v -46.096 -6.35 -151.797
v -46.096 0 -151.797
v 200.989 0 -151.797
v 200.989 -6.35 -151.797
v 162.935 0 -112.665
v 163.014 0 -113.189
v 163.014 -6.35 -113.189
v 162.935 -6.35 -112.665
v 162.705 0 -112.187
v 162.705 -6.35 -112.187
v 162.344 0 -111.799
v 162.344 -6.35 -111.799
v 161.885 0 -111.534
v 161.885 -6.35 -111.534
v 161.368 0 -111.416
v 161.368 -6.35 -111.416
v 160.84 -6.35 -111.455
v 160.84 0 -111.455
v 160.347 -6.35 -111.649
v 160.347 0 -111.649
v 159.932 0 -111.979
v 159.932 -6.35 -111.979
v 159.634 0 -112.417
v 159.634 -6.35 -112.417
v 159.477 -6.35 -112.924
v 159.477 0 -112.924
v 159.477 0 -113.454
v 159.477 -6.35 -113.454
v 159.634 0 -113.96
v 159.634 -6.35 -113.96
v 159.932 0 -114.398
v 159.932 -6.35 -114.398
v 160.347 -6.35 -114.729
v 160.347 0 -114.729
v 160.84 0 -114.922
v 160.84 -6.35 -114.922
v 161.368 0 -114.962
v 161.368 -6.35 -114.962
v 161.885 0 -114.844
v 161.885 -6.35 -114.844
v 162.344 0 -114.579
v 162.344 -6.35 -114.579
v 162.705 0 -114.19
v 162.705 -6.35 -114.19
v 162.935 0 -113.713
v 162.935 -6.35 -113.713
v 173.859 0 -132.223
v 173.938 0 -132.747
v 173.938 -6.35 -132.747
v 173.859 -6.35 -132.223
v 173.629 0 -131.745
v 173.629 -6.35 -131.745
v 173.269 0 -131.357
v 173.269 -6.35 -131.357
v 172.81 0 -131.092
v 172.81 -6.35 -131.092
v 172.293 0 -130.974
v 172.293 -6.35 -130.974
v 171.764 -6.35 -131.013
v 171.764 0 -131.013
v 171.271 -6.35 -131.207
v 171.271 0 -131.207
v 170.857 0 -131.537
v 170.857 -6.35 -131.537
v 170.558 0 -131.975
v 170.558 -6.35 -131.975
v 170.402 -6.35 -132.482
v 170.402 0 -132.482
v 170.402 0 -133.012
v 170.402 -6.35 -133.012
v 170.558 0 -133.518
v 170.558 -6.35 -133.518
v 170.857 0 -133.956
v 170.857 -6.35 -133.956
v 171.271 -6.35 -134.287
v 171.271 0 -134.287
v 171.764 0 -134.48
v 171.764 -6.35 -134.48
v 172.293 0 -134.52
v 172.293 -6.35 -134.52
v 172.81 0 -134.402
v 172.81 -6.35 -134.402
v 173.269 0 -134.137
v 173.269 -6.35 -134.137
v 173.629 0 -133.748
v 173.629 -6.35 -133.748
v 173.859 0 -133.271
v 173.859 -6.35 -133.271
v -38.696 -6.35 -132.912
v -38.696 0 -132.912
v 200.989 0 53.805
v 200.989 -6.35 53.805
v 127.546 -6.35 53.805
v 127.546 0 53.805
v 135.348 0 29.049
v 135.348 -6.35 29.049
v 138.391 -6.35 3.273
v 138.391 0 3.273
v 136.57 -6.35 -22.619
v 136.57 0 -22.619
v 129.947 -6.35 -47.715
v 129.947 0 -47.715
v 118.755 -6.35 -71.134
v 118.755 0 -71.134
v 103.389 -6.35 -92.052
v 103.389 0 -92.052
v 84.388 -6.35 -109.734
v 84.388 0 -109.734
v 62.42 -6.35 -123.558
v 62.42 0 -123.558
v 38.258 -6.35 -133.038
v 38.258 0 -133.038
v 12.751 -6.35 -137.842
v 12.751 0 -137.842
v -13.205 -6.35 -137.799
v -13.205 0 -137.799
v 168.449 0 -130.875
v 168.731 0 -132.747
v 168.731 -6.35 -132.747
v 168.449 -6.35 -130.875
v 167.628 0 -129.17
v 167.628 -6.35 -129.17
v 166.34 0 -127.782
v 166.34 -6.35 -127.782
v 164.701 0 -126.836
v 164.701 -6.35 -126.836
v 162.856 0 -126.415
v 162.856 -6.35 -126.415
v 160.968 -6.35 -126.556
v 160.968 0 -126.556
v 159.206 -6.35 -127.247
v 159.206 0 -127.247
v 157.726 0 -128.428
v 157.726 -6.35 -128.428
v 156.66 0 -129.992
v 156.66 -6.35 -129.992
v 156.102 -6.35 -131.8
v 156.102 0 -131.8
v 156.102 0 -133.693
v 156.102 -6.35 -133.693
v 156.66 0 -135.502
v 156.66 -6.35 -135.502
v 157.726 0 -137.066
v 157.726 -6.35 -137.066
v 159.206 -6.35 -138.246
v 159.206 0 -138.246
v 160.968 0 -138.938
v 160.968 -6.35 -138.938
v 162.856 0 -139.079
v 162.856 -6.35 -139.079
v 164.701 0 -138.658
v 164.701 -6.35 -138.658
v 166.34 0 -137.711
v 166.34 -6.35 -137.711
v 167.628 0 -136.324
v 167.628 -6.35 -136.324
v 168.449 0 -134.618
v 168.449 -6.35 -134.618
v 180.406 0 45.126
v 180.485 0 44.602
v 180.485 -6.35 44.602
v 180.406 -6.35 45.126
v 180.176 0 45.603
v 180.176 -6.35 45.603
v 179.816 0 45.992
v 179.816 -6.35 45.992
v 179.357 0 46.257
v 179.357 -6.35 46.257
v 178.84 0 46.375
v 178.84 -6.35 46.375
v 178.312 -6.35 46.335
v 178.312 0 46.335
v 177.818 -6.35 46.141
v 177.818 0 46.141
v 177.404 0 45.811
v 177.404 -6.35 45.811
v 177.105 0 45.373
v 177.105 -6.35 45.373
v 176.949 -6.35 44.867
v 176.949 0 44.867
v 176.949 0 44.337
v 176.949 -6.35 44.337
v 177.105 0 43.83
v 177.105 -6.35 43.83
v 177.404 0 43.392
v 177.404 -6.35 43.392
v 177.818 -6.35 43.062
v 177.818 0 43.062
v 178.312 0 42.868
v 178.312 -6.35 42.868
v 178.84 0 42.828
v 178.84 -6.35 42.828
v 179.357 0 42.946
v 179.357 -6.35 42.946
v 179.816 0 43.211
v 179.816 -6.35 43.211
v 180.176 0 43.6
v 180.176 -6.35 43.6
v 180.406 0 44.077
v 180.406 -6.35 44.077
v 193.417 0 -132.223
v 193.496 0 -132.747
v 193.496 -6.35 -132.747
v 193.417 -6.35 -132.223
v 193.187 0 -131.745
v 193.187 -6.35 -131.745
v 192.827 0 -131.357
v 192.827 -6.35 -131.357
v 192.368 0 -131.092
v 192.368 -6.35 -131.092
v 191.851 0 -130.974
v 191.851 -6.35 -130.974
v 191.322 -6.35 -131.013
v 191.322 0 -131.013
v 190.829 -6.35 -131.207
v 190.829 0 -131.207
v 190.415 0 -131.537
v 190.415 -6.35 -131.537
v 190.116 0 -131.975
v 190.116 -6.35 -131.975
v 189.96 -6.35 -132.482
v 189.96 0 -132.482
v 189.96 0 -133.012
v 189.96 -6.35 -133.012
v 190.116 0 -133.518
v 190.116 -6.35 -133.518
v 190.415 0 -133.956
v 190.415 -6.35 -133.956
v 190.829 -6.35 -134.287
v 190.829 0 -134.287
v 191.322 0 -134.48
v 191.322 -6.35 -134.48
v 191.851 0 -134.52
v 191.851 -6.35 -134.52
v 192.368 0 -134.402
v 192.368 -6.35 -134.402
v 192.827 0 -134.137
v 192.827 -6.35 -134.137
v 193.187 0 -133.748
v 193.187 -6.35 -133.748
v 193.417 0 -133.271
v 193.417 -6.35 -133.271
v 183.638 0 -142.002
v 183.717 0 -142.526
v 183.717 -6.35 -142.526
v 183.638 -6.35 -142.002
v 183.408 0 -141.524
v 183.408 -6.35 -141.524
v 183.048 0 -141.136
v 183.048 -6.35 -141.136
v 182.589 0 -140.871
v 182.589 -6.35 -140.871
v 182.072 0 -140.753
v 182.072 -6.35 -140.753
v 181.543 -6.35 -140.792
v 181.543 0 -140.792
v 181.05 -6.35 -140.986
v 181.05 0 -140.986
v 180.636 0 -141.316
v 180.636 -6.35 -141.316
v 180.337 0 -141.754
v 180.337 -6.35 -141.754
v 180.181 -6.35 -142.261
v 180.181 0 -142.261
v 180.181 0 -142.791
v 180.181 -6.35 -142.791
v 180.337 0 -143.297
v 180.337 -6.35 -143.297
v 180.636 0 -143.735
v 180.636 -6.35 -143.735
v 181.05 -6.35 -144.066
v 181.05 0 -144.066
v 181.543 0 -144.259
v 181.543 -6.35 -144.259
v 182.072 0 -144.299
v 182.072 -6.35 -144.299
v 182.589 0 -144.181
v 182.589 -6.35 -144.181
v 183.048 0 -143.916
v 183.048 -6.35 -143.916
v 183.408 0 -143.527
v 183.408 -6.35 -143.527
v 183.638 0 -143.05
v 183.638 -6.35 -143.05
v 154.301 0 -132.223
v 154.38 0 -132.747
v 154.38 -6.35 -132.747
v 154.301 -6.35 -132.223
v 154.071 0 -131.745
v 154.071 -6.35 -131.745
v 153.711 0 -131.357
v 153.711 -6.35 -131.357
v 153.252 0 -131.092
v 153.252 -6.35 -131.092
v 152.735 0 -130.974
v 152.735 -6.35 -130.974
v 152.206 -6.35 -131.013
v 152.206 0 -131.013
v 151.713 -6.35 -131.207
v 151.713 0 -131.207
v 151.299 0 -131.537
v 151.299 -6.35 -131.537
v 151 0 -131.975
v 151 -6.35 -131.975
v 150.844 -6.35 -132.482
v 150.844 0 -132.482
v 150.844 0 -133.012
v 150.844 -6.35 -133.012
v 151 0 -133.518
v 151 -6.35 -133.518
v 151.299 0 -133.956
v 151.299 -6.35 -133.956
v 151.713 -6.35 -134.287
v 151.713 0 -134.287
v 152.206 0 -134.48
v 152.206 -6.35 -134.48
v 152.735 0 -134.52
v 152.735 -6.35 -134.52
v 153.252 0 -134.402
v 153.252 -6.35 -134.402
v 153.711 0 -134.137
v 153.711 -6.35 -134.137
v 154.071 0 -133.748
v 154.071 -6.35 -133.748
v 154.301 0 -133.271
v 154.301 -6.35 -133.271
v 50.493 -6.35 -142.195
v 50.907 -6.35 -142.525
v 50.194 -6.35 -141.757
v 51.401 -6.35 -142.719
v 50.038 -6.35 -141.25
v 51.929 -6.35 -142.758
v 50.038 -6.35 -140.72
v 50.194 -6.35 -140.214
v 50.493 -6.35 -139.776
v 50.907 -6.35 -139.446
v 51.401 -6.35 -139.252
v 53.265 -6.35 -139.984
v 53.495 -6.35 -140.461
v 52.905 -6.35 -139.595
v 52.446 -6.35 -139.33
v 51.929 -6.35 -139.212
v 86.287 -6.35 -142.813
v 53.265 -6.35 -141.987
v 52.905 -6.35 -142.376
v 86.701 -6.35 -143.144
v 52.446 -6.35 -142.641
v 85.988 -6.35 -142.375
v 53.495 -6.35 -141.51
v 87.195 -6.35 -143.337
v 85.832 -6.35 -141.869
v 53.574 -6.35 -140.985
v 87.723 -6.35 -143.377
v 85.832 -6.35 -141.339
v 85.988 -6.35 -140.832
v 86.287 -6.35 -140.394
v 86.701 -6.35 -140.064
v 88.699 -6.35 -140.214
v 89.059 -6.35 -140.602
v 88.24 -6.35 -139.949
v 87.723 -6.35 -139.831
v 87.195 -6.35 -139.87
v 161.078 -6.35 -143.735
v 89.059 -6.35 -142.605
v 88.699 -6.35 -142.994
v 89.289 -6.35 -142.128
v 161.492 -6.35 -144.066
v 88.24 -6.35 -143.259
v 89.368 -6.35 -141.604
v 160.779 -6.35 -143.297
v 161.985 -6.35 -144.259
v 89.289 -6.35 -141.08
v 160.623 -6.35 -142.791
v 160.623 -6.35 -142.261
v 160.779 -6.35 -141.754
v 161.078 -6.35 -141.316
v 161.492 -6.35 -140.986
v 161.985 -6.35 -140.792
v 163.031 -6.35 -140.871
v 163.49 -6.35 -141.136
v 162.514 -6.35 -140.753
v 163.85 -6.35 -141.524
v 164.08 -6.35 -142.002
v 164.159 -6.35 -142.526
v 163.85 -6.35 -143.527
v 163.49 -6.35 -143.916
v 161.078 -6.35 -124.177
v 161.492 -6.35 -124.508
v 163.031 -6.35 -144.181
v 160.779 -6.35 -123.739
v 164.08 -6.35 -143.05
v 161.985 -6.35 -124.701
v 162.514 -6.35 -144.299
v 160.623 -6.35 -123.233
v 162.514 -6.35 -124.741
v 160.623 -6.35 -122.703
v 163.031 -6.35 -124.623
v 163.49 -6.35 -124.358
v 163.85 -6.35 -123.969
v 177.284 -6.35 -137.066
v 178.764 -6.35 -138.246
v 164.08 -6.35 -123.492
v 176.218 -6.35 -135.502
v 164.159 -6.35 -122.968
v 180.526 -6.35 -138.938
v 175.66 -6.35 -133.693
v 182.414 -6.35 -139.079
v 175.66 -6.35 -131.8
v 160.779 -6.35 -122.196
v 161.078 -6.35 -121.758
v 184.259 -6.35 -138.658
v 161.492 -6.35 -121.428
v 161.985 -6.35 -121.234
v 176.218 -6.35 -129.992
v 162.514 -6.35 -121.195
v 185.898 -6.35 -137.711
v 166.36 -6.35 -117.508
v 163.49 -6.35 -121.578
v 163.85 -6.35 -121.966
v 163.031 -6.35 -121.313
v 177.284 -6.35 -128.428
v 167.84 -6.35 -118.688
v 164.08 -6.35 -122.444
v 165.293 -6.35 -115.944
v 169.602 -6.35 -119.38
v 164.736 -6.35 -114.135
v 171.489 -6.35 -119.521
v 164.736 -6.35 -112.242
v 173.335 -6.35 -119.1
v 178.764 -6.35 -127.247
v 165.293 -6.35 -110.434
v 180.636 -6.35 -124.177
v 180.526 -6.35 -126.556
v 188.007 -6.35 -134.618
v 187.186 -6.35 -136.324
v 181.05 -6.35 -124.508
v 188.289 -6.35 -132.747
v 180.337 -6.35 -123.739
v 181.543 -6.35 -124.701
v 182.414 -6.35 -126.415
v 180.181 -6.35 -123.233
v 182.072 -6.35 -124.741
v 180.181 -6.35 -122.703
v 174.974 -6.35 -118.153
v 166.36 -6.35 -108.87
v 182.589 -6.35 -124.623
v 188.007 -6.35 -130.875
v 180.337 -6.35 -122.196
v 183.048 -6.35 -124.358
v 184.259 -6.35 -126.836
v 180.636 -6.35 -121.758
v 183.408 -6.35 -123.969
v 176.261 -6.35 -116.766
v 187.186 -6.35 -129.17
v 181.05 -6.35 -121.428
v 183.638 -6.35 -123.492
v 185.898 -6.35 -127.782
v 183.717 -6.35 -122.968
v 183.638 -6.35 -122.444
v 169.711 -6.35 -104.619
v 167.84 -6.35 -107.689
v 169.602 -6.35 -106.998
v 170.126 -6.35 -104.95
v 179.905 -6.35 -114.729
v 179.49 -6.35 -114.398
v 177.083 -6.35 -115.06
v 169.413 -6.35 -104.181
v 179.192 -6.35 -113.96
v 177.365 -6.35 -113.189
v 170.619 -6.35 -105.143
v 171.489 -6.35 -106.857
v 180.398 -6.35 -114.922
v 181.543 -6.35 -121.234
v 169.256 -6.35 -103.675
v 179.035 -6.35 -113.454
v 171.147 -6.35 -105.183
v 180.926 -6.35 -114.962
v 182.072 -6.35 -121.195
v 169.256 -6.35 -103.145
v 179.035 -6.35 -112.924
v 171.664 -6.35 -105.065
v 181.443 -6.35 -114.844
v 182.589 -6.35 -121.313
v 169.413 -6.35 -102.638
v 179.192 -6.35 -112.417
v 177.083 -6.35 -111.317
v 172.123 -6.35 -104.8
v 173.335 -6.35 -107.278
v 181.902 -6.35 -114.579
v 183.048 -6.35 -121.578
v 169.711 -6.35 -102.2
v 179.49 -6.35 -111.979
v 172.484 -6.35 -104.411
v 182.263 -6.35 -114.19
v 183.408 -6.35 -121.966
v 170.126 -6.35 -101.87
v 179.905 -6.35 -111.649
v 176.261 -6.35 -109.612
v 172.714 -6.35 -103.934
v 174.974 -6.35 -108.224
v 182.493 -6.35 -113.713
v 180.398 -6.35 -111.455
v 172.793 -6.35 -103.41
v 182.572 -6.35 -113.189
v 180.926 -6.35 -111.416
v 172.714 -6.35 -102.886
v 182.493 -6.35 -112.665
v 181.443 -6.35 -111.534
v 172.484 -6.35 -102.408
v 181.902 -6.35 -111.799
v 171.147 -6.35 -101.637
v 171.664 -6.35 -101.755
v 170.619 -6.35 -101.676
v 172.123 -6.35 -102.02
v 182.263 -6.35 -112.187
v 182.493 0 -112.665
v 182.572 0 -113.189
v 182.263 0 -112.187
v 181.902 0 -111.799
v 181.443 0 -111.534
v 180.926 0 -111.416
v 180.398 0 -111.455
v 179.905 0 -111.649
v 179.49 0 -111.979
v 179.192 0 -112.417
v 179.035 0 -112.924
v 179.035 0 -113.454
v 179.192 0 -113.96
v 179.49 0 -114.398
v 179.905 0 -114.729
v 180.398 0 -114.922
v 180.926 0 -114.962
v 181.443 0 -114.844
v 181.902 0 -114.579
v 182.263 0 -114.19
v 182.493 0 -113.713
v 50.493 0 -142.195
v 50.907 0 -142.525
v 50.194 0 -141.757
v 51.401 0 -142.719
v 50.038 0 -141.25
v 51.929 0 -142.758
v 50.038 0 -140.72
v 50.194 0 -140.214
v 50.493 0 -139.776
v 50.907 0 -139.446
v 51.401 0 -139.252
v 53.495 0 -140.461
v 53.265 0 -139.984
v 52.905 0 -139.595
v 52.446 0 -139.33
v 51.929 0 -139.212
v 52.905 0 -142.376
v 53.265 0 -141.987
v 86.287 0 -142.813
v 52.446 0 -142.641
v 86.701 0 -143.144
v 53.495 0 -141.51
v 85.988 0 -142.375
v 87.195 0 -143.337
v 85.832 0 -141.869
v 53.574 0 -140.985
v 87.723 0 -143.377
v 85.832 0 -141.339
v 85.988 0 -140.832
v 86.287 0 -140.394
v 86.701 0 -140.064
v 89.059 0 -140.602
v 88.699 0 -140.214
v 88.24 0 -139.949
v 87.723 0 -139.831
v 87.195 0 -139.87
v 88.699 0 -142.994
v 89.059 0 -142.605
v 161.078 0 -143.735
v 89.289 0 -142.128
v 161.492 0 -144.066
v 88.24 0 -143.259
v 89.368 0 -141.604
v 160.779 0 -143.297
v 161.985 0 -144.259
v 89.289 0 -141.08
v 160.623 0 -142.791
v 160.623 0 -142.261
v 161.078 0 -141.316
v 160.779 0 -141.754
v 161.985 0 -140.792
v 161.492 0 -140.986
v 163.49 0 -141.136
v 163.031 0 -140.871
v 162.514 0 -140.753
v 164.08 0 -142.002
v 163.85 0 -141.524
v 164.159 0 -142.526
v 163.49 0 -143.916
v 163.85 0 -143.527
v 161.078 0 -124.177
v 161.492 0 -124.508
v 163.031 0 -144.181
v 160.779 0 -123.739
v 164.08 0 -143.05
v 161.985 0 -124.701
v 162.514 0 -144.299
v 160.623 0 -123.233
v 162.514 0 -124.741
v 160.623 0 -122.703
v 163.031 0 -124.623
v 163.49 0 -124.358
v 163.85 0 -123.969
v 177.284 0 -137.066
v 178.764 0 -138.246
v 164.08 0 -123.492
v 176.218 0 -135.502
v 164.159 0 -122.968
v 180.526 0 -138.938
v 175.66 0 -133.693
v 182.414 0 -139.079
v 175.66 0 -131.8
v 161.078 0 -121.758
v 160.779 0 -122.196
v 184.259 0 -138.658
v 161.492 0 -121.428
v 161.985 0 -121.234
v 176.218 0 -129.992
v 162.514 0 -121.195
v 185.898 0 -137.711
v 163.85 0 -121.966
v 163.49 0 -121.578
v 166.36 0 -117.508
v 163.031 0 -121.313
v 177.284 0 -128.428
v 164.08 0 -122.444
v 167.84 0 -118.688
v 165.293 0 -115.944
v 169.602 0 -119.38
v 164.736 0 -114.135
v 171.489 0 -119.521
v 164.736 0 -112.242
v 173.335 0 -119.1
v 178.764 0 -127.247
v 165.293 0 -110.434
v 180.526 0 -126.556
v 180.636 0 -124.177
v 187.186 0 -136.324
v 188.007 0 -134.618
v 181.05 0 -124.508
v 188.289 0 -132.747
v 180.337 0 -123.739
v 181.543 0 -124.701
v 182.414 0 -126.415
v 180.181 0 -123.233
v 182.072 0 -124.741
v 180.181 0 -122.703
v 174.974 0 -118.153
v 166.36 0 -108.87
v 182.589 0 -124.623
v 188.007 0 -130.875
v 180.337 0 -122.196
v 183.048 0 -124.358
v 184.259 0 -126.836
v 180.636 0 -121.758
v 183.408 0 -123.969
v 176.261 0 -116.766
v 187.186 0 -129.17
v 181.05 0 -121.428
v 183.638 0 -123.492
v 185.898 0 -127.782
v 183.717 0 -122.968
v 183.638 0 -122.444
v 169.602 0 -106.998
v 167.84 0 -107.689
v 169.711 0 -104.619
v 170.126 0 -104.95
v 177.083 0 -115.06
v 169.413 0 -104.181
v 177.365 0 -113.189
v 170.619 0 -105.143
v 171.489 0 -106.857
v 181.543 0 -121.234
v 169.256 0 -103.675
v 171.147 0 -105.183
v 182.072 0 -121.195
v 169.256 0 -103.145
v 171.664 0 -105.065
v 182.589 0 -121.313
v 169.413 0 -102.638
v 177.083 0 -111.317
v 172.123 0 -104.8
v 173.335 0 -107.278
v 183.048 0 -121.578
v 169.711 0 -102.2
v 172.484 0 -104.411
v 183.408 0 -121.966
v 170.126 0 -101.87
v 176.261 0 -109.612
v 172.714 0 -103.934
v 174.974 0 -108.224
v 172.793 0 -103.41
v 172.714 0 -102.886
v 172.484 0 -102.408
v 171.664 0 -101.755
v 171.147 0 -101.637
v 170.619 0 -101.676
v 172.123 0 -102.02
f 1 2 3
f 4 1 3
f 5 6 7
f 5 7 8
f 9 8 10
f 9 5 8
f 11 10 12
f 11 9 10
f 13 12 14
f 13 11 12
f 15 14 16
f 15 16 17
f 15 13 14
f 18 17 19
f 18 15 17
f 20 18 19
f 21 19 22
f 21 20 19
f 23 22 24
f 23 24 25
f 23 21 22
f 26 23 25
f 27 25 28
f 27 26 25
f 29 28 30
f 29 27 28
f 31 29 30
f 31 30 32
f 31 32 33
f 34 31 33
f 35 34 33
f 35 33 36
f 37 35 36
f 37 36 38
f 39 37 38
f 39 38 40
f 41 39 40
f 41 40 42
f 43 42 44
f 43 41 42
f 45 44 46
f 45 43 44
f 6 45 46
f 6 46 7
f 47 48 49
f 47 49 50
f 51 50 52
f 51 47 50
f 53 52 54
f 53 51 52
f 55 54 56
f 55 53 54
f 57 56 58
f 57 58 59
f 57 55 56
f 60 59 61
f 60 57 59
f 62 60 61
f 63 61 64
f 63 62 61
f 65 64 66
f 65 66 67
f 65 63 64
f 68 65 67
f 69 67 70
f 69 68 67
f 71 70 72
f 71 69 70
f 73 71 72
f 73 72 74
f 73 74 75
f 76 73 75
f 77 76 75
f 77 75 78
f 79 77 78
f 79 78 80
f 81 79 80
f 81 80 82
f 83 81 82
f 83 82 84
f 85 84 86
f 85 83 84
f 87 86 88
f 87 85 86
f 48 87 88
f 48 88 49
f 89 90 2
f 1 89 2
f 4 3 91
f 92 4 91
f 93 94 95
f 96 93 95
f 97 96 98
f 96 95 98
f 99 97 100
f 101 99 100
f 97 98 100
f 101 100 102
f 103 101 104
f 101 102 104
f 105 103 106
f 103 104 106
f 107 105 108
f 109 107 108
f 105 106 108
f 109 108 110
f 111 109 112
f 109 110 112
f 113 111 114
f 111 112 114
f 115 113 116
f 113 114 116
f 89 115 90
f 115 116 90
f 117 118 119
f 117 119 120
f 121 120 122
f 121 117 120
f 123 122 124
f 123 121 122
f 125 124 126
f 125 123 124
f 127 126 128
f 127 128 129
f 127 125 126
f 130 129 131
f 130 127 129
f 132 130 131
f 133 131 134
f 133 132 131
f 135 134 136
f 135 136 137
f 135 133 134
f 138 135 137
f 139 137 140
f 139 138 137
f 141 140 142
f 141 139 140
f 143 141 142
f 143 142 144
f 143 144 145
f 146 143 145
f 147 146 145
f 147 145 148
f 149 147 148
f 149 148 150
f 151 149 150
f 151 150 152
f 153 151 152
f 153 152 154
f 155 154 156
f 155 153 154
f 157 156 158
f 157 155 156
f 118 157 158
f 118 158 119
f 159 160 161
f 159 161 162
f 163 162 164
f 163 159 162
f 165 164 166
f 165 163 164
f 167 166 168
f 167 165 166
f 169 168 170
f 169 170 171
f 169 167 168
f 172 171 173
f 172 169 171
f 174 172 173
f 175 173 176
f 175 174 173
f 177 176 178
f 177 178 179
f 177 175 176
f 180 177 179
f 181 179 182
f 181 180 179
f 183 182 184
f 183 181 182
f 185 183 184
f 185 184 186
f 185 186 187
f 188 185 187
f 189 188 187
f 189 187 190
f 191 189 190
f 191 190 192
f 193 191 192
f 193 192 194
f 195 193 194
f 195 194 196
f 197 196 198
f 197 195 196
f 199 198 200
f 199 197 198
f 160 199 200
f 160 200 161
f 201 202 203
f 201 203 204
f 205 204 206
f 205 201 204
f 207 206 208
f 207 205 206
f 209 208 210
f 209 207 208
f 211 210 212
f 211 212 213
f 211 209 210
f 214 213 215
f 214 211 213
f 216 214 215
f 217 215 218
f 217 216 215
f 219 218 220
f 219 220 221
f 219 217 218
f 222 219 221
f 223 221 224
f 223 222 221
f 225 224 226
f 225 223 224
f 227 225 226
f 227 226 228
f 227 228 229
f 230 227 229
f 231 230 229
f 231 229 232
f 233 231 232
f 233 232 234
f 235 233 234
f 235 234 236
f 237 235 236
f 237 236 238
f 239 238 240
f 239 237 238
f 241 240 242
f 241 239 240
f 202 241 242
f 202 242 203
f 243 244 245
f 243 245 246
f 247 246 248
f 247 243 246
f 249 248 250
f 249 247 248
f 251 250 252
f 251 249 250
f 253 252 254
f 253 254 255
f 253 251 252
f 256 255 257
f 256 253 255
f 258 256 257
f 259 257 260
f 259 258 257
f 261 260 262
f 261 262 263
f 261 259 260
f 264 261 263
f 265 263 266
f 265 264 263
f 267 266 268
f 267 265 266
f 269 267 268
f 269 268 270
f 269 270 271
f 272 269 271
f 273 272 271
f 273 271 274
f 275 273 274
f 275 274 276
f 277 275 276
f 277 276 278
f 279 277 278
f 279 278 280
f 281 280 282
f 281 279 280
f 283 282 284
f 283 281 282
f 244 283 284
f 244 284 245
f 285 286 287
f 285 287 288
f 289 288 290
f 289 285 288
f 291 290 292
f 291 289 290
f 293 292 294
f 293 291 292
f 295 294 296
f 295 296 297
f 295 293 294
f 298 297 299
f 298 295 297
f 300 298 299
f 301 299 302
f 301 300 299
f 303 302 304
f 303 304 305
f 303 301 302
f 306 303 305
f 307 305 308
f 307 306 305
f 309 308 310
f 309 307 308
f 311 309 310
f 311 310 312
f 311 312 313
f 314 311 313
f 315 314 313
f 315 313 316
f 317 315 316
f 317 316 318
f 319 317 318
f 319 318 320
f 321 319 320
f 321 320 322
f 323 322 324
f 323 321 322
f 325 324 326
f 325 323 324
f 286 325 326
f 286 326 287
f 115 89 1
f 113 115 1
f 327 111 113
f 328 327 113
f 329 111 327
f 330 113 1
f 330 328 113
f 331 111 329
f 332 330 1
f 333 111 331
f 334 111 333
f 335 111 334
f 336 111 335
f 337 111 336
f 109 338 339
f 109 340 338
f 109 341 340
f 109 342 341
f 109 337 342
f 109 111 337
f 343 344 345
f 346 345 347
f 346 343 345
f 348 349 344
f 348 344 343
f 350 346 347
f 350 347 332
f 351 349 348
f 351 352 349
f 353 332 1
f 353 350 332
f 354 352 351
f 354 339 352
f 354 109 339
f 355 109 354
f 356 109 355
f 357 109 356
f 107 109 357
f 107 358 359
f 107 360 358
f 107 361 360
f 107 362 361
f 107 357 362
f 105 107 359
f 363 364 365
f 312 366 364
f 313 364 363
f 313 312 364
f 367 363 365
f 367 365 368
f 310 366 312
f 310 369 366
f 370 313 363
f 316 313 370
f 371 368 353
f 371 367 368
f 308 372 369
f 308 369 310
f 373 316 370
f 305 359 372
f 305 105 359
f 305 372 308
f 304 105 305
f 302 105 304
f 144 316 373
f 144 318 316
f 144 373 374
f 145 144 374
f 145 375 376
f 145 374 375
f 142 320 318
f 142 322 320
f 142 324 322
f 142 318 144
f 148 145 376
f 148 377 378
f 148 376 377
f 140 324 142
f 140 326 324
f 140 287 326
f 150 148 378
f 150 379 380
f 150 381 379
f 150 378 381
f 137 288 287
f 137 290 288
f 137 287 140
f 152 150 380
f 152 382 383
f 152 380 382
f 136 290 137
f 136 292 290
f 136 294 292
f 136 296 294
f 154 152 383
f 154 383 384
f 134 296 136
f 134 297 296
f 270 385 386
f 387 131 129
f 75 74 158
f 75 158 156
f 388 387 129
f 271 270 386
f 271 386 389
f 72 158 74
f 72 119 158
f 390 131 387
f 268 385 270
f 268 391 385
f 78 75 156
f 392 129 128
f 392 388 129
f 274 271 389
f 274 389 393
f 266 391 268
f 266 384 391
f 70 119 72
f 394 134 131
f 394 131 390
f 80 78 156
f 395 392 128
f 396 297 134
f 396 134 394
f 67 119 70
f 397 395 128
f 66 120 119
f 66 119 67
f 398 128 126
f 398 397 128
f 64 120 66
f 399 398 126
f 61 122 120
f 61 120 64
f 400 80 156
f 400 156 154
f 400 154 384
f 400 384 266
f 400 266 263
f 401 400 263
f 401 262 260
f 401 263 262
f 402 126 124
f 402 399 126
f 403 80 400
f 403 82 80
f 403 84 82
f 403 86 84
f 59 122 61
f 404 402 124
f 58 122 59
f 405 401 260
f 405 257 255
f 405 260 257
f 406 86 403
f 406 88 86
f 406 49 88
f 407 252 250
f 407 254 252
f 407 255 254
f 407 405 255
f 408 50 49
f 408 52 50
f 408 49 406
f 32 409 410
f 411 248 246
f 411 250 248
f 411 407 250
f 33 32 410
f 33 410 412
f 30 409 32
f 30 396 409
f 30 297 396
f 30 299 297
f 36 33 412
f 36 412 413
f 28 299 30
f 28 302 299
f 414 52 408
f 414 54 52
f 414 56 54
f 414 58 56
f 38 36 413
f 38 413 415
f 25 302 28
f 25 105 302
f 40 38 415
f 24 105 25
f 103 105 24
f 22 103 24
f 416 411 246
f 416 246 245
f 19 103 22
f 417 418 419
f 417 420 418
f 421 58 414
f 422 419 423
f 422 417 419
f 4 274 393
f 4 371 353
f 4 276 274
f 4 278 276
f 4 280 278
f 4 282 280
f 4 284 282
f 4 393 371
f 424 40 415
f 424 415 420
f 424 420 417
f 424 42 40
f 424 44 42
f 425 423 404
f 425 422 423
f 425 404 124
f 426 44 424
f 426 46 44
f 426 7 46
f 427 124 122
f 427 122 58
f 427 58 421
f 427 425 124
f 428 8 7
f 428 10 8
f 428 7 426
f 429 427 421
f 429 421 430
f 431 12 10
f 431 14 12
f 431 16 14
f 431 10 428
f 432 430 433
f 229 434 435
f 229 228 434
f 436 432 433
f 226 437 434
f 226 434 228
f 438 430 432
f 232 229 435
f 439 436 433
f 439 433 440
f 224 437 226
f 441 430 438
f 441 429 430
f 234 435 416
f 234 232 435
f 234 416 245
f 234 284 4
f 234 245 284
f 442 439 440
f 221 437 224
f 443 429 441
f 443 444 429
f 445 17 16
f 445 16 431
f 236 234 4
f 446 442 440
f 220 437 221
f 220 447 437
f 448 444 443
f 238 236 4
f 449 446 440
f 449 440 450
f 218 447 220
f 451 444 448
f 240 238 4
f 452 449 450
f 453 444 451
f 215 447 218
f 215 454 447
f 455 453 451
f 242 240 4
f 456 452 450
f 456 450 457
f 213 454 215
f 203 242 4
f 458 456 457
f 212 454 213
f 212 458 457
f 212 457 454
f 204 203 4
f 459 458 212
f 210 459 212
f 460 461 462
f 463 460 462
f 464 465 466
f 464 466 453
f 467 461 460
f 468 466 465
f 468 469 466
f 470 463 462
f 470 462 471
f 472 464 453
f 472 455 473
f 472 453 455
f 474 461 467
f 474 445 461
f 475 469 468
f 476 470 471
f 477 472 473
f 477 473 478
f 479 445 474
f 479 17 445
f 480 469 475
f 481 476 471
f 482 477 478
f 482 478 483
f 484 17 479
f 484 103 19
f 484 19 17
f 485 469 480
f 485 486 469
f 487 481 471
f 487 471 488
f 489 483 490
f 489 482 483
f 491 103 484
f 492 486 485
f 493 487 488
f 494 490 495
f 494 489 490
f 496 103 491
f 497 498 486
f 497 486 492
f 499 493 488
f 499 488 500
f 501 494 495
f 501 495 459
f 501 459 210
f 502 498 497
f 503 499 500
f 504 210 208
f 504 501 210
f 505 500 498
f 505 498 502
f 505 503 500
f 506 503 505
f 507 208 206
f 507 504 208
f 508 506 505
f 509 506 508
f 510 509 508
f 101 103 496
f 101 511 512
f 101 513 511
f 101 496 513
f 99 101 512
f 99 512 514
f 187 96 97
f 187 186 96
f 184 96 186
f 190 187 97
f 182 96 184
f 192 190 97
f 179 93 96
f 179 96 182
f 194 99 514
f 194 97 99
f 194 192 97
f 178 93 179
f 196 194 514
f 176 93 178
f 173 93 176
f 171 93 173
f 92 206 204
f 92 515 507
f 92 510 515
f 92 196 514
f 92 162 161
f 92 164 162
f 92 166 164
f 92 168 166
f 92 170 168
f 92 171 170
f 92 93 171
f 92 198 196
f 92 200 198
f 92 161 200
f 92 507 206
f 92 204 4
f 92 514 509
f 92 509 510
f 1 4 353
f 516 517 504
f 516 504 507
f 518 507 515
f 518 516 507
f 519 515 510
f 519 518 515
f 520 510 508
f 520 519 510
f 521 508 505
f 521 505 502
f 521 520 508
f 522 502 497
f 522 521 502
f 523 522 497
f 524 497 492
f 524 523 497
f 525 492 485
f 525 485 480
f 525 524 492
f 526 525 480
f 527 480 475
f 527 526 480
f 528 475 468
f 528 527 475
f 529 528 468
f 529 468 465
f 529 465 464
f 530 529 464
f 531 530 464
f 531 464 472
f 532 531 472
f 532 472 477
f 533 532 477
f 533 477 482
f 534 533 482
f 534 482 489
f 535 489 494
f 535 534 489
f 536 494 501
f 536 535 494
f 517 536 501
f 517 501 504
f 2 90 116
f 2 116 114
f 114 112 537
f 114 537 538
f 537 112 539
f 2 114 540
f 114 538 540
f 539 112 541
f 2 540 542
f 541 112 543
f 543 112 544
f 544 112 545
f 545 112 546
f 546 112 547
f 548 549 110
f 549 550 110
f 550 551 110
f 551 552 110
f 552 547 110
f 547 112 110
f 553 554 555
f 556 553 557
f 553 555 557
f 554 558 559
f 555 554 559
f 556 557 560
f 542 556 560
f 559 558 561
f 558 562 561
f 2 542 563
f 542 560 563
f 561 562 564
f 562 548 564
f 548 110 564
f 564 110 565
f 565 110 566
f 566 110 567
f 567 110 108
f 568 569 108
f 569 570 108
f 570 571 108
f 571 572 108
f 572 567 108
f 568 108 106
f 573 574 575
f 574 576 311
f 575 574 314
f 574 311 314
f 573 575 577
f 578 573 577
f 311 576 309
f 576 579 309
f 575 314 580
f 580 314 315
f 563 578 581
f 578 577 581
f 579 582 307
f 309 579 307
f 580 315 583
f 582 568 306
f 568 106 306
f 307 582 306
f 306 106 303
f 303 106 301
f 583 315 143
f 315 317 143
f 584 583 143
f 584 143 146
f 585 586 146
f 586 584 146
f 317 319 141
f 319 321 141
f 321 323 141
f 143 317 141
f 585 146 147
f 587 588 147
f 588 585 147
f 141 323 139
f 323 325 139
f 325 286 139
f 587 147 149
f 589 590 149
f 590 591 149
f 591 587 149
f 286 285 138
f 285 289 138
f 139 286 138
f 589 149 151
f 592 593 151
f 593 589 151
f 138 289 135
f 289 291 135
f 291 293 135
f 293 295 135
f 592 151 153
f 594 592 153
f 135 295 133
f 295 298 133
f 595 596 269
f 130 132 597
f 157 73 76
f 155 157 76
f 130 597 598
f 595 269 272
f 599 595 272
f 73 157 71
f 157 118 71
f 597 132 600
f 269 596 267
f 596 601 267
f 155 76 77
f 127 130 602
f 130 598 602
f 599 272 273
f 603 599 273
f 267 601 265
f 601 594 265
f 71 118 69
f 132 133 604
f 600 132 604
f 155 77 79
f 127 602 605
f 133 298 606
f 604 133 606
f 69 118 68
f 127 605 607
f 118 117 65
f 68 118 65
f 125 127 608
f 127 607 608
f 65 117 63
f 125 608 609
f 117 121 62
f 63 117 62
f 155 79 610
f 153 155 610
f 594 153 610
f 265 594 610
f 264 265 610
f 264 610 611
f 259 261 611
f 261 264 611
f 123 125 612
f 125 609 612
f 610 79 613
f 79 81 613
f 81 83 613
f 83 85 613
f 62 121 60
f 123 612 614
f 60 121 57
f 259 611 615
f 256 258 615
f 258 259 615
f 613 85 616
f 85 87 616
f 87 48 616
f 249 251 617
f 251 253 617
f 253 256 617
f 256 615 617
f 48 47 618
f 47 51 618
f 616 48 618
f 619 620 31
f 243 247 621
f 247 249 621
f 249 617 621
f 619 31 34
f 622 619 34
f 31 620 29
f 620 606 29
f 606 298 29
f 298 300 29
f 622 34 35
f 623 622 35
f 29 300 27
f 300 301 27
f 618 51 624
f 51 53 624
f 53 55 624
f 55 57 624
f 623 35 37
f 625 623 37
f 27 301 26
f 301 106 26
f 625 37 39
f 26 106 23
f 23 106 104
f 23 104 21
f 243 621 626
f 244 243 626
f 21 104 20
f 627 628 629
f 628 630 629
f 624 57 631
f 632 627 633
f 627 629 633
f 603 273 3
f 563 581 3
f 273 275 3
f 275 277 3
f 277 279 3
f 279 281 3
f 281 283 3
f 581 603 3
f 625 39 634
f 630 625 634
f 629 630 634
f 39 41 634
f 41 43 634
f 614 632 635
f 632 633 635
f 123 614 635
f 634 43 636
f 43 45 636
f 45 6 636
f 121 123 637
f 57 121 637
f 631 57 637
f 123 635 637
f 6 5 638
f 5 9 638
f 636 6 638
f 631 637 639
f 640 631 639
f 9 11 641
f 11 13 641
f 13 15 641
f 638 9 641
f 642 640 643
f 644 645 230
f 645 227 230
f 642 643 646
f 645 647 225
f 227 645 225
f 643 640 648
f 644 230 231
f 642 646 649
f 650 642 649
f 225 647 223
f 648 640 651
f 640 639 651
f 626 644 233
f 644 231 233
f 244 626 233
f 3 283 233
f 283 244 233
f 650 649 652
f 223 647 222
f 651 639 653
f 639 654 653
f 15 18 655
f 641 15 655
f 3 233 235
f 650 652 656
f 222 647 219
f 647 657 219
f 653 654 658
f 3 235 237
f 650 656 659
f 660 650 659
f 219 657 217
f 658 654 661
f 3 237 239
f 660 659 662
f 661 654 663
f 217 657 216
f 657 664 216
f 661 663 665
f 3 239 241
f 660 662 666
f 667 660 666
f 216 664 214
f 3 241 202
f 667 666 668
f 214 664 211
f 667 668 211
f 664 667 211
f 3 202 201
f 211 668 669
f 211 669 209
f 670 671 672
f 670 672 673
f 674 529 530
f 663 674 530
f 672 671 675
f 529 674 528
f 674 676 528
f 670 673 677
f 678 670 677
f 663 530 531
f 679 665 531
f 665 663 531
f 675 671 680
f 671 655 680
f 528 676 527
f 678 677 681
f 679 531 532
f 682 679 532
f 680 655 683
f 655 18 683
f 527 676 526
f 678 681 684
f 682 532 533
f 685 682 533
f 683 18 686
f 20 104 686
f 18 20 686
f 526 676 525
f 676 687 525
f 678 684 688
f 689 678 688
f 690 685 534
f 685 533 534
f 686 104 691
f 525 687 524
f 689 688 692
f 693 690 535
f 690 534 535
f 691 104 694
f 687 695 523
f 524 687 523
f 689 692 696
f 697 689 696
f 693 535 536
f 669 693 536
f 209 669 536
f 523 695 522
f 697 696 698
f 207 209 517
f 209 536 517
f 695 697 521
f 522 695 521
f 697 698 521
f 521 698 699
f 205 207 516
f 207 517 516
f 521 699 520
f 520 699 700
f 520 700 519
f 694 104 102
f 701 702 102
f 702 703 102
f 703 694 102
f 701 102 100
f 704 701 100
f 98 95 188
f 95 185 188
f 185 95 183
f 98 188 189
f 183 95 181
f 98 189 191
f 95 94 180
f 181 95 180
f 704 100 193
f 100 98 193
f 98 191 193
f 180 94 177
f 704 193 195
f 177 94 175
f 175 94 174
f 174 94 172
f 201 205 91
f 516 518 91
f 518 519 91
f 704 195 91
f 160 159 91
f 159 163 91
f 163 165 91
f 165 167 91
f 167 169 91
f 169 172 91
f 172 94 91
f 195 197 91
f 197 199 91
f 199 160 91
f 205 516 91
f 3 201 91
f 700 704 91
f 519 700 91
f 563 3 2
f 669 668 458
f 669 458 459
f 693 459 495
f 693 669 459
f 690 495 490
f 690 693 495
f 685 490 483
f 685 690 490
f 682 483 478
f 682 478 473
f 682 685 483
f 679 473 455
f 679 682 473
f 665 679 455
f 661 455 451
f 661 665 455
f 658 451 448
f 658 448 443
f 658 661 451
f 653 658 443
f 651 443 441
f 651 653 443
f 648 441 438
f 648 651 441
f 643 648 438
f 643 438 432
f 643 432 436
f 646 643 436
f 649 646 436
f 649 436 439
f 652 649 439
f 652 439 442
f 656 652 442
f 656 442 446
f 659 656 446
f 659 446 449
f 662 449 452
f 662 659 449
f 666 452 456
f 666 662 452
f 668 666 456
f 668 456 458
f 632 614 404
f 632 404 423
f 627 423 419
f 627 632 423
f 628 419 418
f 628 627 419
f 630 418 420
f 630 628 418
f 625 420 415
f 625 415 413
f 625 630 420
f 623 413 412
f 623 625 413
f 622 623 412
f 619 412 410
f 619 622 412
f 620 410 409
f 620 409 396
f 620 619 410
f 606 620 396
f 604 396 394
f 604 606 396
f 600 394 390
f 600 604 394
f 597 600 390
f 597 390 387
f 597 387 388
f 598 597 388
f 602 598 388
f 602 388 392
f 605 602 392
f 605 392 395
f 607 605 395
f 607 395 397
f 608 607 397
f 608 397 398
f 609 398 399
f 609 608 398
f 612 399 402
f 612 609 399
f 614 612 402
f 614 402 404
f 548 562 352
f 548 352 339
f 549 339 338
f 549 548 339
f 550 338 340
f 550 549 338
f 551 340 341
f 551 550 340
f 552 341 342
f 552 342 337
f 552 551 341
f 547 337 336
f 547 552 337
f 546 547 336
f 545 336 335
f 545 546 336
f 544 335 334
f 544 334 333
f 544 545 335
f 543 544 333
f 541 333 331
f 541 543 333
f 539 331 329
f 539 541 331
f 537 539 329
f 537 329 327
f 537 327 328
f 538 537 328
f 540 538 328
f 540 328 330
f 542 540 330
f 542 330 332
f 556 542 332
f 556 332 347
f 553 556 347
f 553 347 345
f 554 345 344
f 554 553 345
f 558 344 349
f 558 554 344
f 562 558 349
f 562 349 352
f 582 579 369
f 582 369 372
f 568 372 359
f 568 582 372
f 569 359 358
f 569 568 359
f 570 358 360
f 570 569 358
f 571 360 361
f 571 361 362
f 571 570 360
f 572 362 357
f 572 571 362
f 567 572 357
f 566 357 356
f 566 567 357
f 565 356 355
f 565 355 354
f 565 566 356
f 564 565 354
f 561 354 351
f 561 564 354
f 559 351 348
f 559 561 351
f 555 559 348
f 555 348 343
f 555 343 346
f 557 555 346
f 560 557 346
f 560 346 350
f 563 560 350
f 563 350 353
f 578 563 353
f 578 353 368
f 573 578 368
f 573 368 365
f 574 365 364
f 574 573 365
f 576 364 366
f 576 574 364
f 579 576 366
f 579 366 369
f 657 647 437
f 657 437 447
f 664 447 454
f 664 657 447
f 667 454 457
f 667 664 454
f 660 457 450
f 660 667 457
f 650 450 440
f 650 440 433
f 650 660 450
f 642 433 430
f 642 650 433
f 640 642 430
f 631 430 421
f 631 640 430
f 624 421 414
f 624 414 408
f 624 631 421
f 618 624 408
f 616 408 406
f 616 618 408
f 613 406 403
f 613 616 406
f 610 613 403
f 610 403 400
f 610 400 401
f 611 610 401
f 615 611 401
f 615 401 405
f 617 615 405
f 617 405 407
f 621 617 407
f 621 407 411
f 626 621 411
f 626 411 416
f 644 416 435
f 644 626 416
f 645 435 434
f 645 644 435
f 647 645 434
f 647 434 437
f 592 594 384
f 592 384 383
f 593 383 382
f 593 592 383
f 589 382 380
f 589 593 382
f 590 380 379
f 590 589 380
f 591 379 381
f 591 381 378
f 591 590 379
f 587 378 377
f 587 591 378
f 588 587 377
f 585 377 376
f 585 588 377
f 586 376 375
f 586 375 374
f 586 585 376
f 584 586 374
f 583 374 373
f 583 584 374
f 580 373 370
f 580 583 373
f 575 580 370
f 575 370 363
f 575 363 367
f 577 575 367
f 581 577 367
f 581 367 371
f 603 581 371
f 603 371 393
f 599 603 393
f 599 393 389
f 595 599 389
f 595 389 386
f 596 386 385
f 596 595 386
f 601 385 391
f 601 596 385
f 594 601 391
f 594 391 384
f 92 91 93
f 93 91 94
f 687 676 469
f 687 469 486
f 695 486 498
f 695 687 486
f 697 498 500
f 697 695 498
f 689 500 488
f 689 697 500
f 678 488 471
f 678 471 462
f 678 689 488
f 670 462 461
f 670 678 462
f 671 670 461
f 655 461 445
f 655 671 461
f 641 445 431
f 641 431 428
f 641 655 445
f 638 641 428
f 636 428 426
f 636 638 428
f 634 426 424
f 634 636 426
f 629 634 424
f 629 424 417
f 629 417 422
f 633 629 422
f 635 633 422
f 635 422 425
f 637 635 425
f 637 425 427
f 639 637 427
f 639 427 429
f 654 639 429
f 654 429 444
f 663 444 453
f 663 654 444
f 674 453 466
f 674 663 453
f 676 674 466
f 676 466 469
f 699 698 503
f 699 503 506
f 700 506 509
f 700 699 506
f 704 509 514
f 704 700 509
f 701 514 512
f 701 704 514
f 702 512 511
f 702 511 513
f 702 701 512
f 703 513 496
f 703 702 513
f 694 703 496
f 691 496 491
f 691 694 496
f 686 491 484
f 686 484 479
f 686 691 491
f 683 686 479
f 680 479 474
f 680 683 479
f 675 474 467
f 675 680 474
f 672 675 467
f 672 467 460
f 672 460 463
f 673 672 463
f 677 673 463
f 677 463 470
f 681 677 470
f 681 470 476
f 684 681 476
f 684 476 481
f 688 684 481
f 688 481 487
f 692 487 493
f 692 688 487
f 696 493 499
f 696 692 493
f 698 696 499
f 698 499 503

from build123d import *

# Parameters (mm, degrees)
F0_R     = 1.778
F0_R_2   = 6.35
F1_DEPTH = 6.35


with BuildPart() as f1:
    # F0 (on Front) → F1 (new body)
    with BuildSketch(Plane.XZ):
        with BuildLine():
            ThreePointArc((127.545797, 53.804597), (103.389041, -92.052002), (-38.696128, -132.911529))
            Line((-38.696128, -132.911529), (-46.095596, -151.796758))
            Line((-46.095596, -151.796758), (-38.616359, -151.796758))
            Line((-38.616359, -151.796758), (200.989076, -151.796758))
            Line((200.989076, -151.796758), (200.989076, -145.446758))
            Line((200.989076, -145.446758), (200.989076, 53.804597))
            Line((200.989076, 53.804597), (127.545797, 53.804597))
        make_face()
        with Locations((51.796343, -140.985444)):
            Circle(F0_R, mode=Mode.SUBTRACT)
        with Locations((87.590314, -141.603768)):
            Circle(F0_R, mode=Mode.SUBTRACT)
        with Locations((162.381076, -142.525758)):
            Circle(F0_R, mode=Mode.SUBTRACT)
        with Locations((152.602076, -132.746758)):
            Circle(F0_R, mode=Mode.SUBTRACT)
        with Locations((162.381076, -132.746758)):
            Circle(F0_R_2, mode=Mode.SUBTRACT)
        with Locations((181.939076, -142.525758)):
            Circle(F0_R, mode=Mode.SUBTRACT)
        with Locations((172.160076, -132.746758)):
            Circle(F0_R, mode=Mode.SUBTRACT)
        with Locations((181.939076, -132.746758)):
            Circle(F0_R_2, mode=Mode.SUBTRACT)
        with Locations((191.718076, -132.746758)):
            Circle(F0_R, mode=Mode.SUBTRACT)
        with Locations((162.381076, -122.967758)):
            Circle(F0_R, mode=Mode.SUBTRACT)
        with Locations((161.235617, -113.188758)):
            Circle(F0_R, mode=Mode.SUBTRACT)
        with Locations((181.939076, -122.967758)):
            Circle(F0_R, mode=Mode.SUBTRACT)
        with Locations((171.014617, -113.188758)):
            Circle(F0_R_2, mode=Mode.SUBTRACT)
        with Locations((180.793617, -113.188758)):
            Circle(F0_R, mode=Mode.SUBTRACT)
        with Locations((171.014617, -103.409758)):
            Circle(F0_R, mode=Mode.SUBTRACT)
        with Locations((178.707197, 44.601519)):
            Circle(F0_R, mode=Mode.SUBTRACT)
    extrude(amount=F1_DEPTH)


solid = f1.part
